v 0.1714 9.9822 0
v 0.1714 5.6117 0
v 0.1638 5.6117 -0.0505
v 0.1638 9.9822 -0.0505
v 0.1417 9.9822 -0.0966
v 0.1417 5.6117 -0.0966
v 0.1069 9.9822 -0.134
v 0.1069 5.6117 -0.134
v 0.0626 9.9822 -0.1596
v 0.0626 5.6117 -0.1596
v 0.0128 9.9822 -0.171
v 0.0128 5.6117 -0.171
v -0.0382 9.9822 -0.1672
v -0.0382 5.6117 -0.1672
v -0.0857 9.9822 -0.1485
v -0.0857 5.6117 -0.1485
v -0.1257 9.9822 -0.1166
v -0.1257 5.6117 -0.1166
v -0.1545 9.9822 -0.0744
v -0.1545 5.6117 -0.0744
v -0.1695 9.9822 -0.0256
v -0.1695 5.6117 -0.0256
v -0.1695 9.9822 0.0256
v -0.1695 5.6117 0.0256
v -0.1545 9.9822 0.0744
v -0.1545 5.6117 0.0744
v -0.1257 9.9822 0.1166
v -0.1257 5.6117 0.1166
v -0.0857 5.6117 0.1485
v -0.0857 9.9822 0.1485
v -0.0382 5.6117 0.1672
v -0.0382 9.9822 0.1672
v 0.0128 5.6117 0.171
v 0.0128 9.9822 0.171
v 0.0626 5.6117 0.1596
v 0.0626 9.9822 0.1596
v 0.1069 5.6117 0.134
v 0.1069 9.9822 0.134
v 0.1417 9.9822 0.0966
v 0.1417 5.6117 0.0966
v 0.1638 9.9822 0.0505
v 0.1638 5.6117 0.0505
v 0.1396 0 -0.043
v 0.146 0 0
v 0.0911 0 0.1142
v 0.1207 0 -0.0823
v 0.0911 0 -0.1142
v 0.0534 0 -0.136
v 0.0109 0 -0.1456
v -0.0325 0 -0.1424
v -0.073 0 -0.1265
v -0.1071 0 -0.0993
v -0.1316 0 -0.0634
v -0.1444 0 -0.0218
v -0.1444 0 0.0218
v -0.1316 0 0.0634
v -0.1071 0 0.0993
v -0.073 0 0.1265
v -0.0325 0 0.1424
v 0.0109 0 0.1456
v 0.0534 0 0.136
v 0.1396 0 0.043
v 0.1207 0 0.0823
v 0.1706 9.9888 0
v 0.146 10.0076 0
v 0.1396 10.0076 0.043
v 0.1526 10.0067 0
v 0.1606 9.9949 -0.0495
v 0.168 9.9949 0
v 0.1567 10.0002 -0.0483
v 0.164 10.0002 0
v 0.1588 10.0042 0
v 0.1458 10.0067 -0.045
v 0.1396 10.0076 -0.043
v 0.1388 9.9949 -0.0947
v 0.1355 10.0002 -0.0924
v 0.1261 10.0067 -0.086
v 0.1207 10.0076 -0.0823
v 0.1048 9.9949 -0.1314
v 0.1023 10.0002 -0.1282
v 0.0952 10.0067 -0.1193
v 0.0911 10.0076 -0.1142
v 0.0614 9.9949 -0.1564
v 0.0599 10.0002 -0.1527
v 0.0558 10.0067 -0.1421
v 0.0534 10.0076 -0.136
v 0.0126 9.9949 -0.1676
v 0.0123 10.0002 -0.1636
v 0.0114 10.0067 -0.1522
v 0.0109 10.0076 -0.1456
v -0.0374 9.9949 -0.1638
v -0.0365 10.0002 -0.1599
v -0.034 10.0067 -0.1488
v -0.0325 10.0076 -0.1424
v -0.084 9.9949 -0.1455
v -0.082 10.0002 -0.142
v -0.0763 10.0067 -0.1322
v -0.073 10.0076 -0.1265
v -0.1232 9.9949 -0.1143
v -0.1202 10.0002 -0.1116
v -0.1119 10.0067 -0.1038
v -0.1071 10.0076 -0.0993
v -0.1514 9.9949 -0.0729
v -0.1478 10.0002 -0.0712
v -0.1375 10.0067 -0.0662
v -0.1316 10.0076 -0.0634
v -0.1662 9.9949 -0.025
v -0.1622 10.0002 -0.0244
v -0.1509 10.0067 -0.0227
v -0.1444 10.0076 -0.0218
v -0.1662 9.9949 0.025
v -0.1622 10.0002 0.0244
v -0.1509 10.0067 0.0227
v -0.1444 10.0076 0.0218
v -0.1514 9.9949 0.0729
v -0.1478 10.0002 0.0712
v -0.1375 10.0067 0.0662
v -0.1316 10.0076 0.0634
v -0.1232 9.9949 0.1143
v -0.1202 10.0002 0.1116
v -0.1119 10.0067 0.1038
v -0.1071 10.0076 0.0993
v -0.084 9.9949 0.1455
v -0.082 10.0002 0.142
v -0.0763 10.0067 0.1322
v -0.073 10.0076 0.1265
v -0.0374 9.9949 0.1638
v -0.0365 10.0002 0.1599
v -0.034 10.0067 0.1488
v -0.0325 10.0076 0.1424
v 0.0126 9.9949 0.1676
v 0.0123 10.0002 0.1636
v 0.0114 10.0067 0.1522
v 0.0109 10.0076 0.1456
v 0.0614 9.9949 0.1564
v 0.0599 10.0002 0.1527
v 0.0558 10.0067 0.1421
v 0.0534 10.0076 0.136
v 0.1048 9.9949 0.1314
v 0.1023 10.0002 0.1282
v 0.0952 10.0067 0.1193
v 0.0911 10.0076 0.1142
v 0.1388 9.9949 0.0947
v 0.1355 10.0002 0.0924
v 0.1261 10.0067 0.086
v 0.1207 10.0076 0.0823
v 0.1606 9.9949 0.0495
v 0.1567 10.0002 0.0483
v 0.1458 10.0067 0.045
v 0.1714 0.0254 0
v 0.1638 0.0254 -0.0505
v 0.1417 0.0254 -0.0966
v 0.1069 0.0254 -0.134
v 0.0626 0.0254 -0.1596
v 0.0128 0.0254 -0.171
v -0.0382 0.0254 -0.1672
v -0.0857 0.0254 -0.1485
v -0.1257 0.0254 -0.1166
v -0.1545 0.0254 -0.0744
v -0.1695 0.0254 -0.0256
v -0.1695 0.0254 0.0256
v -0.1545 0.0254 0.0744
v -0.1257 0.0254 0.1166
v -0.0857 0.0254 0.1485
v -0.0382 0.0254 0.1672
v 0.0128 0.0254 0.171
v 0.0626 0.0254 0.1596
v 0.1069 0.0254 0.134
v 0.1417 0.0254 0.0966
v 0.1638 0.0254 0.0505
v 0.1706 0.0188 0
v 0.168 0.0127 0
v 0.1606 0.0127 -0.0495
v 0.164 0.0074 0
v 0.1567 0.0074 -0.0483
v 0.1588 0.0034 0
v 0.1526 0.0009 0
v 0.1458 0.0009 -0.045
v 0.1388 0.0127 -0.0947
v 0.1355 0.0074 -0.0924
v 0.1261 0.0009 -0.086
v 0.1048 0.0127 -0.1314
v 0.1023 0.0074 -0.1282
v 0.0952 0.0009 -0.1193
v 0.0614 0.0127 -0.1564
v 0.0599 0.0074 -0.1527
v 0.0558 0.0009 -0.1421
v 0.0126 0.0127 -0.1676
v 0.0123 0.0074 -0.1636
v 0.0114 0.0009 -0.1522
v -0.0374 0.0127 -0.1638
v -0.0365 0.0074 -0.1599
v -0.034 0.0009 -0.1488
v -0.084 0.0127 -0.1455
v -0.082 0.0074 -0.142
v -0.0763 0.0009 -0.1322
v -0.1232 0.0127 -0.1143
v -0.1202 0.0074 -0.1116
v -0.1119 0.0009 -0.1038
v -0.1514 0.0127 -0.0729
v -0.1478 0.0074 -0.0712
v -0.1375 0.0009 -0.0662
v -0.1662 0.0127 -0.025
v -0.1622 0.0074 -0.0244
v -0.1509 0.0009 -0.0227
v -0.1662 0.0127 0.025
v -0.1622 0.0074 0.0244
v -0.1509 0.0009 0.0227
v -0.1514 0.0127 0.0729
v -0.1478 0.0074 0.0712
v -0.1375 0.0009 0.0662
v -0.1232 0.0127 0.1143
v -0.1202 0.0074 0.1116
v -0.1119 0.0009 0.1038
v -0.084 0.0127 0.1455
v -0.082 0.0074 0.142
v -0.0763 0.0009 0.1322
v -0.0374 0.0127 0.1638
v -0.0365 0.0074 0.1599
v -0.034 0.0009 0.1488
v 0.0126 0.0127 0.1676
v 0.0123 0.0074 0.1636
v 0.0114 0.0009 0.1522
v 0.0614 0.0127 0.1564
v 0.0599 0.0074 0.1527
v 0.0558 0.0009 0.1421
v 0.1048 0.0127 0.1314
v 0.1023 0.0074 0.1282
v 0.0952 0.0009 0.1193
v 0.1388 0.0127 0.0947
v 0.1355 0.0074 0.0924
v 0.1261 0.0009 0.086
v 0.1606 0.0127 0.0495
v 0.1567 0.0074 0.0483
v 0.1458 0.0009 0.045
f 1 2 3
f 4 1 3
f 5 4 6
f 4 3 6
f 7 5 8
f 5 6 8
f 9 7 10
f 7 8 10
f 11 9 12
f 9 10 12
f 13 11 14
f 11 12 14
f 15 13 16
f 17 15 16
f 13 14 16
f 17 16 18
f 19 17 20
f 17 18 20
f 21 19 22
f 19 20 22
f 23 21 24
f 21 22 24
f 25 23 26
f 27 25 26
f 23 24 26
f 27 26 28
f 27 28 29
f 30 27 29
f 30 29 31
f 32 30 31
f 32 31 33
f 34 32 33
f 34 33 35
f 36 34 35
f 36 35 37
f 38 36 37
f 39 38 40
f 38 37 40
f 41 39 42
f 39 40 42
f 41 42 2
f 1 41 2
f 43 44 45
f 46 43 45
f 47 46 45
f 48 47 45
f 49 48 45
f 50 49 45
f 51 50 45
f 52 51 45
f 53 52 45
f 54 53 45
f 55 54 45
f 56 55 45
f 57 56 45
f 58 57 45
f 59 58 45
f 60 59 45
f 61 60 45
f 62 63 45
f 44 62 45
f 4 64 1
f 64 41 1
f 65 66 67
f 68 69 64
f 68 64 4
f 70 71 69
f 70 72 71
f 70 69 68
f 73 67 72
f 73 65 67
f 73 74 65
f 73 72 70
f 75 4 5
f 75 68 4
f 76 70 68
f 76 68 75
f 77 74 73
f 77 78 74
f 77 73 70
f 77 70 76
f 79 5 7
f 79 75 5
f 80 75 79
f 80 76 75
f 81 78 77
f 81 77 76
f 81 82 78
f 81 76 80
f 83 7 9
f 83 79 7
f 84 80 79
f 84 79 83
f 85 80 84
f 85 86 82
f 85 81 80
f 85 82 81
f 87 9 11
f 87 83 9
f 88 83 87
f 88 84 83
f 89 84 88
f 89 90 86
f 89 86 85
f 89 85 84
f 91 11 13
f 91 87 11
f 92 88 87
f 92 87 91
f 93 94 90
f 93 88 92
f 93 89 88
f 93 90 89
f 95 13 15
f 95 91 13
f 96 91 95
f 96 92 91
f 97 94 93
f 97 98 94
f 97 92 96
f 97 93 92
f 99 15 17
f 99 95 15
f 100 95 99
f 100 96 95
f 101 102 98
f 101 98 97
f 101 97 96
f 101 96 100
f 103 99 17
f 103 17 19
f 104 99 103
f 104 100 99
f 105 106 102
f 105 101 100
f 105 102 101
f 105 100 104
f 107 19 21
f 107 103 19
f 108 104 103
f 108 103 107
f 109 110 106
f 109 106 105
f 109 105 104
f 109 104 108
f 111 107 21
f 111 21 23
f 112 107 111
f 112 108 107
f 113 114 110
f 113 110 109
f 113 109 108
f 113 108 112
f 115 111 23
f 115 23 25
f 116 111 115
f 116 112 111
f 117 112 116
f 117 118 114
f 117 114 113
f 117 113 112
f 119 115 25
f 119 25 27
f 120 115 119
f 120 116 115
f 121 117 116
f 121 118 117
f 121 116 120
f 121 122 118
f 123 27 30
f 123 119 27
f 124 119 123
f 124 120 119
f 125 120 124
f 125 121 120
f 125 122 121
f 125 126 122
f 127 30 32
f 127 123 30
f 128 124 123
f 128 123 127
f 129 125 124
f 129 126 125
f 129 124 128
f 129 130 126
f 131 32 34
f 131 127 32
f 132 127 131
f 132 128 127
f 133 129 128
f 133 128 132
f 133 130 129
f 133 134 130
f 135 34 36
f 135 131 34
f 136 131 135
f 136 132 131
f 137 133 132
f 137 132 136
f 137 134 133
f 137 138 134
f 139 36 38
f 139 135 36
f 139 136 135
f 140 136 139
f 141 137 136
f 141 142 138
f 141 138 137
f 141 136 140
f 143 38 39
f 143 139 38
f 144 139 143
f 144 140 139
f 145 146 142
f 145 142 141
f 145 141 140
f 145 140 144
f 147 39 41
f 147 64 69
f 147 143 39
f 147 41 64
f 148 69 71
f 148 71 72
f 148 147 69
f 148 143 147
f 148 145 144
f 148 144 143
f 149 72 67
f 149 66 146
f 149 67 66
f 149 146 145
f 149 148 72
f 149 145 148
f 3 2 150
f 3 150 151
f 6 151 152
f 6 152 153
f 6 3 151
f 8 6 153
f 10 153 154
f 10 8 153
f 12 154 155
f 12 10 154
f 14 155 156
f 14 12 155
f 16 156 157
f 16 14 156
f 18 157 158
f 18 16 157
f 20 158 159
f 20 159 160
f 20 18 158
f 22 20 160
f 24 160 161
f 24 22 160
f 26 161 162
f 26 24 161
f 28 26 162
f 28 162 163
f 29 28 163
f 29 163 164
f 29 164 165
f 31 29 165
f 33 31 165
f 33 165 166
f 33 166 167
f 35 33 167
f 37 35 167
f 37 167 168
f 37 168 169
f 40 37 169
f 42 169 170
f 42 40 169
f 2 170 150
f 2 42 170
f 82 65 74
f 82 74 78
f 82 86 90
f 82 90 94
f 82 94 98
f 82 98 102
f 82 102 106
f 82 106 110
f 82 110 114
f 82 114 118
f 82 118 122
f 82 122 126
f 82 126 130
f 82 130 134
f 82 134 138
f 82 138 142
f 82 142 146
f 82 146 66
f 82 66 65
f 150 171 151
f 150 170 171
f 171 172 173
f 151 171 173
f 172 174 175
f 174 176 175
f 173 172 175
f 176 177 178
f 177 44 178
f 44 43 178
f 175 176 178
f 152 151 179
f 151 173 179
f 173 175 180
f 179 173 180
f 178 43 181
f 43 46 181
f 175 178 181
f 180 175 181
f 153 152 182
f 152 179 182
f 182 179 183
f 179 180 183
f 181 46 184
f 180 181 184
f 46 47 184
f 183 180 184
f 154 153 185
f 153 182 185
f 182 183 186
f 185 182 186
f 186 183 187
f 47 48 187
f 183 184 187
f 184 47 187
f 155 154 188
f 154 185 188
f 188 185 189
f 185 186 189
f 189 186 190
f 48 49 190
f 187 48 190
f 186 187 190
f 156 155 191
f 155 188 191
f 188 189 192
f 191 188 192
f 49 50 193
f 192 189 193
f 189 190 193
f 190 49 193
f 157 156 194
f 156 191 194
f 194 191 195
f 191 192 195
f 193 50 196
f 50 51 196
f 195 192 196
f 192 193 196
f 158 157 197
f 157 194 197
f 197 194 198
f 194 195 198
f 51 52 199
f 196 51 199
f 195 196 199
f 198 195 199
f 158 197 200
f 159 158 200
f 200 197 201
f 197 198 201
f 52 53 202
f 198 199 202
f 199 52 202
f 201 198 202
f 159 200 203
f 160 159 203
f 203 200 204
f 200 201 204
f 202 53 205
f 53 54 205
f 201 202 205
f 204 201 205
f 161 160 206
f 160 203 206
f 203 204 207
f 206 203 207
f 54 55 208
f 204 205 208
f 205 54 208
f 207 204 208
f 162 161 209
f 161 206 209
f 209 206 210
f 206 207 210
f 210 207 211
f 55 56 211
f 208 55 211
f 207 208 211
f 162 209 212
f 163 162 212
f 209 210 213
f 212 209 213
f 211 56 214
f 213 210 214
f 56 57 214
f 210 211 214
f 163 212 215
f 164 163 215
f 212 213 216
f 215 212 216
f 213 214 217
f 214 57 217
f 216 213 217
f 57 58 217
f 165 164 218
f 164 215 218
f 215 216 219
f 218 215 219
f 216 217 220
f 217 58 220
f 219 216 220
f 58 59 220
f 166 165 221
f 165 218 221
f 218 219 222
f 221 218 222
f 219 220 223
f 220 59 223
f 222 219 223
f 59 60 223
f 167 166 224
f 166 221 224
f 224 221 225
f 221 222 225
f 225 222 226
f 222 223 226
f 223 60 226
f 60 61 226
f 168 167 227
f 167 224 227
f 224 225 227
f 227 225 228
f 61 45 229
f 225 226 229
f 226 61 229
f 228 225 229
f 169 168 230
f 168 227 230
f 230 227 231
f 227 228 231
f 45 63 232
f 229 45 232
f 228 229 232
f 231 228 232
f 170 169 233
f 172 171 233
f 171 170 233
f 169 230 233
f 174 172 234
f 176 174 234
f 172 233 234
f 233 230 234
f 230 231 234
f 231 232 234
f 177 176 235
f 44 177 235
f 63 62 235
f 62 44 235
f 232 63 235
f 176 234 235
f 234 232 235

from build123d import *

# Parameters (mm, degrees)
SKETCH1_R           = 0.17145
FILLET1_R           = 0.0254
SKETCH3_W           = 2.124849291
SKETCH3_H           = 3.867225708
CUT_EXTRUDE1_DEPTH  = 1.27
SKETCH4_R           = 0.17145
BOSS_EXTRUDE1_DEPTH = 4.395936
FILLET2_R           = 0.0254


with BuildPart() as part:
    # Sweep1: sweep along a path in Sketch2
    with BuildLine(Plane.XY) as sweep1_path:
        Line((0, 0), (0, 6.582609755))
        ThreePointArc((0, 6.582609755), (0.019334599, 6.679811347), (0.074394878, 6.762214878))
        Line((0.074394878, 6.762214878), (0.433605122, 7.121425122))
        ThreePointArc((0.433605122, 7.121425122), (0.488665401, 7.203828653), (0.508, 7.301030245))
        Line((0.508, 7.301030245), (0.508, 8.41852666))
    # Sketch1 → Sweep1 (sweep)
    with BuildSketch(Plane(origin=(0, 0, 0), x_dir=(1, 0, 0), z_dir=(0, 1, 0))):
        Circle(SKETCH1_R)
    sweep(path=sweep1_path.line)

    # Fillet1
    fillet1_edges = [part.edges().sort_by_distance(p)[0] for p in [
        (-0.17145, 0, 0),
        (0.33655, 8.41852666, 0),
    ]]
    fillet(fillet1_edges, radius=FILLET1_R)

    # Sketch3 → Cut-Extrude1 (cut, symmetric)
    with BuildSketch(Plane.XY):
        with Locations((0.147757535, 7.545276716)):
            Rectangle(SKETCH3_W, SKETCH3_H)
    extrude(amount=CUT_EXTRUDE1_DEPTH, both=True, mode=Mode.SUBTRACT)

    # Sketch4 → Boss-Extrude1 (add)
    with BuildSketch(Plane(origin=(0, 5.611663862, 0), x_dir=(1, 0, 0), z_dir=(0, 1, 0))):
        Circle(SKETCH4_R)
    extrude(amount=BOSS_EXTRUDE1_DEPTH)

    # Fillet2
    fillet2_edges = [part.edges().sort_by_distance(p)[0] for p in [
        (-0.17145, 10.007599862, 0),
    ]]
    fillet(fillet2_edges, radius=FILLET2_R)


solid = part.part
